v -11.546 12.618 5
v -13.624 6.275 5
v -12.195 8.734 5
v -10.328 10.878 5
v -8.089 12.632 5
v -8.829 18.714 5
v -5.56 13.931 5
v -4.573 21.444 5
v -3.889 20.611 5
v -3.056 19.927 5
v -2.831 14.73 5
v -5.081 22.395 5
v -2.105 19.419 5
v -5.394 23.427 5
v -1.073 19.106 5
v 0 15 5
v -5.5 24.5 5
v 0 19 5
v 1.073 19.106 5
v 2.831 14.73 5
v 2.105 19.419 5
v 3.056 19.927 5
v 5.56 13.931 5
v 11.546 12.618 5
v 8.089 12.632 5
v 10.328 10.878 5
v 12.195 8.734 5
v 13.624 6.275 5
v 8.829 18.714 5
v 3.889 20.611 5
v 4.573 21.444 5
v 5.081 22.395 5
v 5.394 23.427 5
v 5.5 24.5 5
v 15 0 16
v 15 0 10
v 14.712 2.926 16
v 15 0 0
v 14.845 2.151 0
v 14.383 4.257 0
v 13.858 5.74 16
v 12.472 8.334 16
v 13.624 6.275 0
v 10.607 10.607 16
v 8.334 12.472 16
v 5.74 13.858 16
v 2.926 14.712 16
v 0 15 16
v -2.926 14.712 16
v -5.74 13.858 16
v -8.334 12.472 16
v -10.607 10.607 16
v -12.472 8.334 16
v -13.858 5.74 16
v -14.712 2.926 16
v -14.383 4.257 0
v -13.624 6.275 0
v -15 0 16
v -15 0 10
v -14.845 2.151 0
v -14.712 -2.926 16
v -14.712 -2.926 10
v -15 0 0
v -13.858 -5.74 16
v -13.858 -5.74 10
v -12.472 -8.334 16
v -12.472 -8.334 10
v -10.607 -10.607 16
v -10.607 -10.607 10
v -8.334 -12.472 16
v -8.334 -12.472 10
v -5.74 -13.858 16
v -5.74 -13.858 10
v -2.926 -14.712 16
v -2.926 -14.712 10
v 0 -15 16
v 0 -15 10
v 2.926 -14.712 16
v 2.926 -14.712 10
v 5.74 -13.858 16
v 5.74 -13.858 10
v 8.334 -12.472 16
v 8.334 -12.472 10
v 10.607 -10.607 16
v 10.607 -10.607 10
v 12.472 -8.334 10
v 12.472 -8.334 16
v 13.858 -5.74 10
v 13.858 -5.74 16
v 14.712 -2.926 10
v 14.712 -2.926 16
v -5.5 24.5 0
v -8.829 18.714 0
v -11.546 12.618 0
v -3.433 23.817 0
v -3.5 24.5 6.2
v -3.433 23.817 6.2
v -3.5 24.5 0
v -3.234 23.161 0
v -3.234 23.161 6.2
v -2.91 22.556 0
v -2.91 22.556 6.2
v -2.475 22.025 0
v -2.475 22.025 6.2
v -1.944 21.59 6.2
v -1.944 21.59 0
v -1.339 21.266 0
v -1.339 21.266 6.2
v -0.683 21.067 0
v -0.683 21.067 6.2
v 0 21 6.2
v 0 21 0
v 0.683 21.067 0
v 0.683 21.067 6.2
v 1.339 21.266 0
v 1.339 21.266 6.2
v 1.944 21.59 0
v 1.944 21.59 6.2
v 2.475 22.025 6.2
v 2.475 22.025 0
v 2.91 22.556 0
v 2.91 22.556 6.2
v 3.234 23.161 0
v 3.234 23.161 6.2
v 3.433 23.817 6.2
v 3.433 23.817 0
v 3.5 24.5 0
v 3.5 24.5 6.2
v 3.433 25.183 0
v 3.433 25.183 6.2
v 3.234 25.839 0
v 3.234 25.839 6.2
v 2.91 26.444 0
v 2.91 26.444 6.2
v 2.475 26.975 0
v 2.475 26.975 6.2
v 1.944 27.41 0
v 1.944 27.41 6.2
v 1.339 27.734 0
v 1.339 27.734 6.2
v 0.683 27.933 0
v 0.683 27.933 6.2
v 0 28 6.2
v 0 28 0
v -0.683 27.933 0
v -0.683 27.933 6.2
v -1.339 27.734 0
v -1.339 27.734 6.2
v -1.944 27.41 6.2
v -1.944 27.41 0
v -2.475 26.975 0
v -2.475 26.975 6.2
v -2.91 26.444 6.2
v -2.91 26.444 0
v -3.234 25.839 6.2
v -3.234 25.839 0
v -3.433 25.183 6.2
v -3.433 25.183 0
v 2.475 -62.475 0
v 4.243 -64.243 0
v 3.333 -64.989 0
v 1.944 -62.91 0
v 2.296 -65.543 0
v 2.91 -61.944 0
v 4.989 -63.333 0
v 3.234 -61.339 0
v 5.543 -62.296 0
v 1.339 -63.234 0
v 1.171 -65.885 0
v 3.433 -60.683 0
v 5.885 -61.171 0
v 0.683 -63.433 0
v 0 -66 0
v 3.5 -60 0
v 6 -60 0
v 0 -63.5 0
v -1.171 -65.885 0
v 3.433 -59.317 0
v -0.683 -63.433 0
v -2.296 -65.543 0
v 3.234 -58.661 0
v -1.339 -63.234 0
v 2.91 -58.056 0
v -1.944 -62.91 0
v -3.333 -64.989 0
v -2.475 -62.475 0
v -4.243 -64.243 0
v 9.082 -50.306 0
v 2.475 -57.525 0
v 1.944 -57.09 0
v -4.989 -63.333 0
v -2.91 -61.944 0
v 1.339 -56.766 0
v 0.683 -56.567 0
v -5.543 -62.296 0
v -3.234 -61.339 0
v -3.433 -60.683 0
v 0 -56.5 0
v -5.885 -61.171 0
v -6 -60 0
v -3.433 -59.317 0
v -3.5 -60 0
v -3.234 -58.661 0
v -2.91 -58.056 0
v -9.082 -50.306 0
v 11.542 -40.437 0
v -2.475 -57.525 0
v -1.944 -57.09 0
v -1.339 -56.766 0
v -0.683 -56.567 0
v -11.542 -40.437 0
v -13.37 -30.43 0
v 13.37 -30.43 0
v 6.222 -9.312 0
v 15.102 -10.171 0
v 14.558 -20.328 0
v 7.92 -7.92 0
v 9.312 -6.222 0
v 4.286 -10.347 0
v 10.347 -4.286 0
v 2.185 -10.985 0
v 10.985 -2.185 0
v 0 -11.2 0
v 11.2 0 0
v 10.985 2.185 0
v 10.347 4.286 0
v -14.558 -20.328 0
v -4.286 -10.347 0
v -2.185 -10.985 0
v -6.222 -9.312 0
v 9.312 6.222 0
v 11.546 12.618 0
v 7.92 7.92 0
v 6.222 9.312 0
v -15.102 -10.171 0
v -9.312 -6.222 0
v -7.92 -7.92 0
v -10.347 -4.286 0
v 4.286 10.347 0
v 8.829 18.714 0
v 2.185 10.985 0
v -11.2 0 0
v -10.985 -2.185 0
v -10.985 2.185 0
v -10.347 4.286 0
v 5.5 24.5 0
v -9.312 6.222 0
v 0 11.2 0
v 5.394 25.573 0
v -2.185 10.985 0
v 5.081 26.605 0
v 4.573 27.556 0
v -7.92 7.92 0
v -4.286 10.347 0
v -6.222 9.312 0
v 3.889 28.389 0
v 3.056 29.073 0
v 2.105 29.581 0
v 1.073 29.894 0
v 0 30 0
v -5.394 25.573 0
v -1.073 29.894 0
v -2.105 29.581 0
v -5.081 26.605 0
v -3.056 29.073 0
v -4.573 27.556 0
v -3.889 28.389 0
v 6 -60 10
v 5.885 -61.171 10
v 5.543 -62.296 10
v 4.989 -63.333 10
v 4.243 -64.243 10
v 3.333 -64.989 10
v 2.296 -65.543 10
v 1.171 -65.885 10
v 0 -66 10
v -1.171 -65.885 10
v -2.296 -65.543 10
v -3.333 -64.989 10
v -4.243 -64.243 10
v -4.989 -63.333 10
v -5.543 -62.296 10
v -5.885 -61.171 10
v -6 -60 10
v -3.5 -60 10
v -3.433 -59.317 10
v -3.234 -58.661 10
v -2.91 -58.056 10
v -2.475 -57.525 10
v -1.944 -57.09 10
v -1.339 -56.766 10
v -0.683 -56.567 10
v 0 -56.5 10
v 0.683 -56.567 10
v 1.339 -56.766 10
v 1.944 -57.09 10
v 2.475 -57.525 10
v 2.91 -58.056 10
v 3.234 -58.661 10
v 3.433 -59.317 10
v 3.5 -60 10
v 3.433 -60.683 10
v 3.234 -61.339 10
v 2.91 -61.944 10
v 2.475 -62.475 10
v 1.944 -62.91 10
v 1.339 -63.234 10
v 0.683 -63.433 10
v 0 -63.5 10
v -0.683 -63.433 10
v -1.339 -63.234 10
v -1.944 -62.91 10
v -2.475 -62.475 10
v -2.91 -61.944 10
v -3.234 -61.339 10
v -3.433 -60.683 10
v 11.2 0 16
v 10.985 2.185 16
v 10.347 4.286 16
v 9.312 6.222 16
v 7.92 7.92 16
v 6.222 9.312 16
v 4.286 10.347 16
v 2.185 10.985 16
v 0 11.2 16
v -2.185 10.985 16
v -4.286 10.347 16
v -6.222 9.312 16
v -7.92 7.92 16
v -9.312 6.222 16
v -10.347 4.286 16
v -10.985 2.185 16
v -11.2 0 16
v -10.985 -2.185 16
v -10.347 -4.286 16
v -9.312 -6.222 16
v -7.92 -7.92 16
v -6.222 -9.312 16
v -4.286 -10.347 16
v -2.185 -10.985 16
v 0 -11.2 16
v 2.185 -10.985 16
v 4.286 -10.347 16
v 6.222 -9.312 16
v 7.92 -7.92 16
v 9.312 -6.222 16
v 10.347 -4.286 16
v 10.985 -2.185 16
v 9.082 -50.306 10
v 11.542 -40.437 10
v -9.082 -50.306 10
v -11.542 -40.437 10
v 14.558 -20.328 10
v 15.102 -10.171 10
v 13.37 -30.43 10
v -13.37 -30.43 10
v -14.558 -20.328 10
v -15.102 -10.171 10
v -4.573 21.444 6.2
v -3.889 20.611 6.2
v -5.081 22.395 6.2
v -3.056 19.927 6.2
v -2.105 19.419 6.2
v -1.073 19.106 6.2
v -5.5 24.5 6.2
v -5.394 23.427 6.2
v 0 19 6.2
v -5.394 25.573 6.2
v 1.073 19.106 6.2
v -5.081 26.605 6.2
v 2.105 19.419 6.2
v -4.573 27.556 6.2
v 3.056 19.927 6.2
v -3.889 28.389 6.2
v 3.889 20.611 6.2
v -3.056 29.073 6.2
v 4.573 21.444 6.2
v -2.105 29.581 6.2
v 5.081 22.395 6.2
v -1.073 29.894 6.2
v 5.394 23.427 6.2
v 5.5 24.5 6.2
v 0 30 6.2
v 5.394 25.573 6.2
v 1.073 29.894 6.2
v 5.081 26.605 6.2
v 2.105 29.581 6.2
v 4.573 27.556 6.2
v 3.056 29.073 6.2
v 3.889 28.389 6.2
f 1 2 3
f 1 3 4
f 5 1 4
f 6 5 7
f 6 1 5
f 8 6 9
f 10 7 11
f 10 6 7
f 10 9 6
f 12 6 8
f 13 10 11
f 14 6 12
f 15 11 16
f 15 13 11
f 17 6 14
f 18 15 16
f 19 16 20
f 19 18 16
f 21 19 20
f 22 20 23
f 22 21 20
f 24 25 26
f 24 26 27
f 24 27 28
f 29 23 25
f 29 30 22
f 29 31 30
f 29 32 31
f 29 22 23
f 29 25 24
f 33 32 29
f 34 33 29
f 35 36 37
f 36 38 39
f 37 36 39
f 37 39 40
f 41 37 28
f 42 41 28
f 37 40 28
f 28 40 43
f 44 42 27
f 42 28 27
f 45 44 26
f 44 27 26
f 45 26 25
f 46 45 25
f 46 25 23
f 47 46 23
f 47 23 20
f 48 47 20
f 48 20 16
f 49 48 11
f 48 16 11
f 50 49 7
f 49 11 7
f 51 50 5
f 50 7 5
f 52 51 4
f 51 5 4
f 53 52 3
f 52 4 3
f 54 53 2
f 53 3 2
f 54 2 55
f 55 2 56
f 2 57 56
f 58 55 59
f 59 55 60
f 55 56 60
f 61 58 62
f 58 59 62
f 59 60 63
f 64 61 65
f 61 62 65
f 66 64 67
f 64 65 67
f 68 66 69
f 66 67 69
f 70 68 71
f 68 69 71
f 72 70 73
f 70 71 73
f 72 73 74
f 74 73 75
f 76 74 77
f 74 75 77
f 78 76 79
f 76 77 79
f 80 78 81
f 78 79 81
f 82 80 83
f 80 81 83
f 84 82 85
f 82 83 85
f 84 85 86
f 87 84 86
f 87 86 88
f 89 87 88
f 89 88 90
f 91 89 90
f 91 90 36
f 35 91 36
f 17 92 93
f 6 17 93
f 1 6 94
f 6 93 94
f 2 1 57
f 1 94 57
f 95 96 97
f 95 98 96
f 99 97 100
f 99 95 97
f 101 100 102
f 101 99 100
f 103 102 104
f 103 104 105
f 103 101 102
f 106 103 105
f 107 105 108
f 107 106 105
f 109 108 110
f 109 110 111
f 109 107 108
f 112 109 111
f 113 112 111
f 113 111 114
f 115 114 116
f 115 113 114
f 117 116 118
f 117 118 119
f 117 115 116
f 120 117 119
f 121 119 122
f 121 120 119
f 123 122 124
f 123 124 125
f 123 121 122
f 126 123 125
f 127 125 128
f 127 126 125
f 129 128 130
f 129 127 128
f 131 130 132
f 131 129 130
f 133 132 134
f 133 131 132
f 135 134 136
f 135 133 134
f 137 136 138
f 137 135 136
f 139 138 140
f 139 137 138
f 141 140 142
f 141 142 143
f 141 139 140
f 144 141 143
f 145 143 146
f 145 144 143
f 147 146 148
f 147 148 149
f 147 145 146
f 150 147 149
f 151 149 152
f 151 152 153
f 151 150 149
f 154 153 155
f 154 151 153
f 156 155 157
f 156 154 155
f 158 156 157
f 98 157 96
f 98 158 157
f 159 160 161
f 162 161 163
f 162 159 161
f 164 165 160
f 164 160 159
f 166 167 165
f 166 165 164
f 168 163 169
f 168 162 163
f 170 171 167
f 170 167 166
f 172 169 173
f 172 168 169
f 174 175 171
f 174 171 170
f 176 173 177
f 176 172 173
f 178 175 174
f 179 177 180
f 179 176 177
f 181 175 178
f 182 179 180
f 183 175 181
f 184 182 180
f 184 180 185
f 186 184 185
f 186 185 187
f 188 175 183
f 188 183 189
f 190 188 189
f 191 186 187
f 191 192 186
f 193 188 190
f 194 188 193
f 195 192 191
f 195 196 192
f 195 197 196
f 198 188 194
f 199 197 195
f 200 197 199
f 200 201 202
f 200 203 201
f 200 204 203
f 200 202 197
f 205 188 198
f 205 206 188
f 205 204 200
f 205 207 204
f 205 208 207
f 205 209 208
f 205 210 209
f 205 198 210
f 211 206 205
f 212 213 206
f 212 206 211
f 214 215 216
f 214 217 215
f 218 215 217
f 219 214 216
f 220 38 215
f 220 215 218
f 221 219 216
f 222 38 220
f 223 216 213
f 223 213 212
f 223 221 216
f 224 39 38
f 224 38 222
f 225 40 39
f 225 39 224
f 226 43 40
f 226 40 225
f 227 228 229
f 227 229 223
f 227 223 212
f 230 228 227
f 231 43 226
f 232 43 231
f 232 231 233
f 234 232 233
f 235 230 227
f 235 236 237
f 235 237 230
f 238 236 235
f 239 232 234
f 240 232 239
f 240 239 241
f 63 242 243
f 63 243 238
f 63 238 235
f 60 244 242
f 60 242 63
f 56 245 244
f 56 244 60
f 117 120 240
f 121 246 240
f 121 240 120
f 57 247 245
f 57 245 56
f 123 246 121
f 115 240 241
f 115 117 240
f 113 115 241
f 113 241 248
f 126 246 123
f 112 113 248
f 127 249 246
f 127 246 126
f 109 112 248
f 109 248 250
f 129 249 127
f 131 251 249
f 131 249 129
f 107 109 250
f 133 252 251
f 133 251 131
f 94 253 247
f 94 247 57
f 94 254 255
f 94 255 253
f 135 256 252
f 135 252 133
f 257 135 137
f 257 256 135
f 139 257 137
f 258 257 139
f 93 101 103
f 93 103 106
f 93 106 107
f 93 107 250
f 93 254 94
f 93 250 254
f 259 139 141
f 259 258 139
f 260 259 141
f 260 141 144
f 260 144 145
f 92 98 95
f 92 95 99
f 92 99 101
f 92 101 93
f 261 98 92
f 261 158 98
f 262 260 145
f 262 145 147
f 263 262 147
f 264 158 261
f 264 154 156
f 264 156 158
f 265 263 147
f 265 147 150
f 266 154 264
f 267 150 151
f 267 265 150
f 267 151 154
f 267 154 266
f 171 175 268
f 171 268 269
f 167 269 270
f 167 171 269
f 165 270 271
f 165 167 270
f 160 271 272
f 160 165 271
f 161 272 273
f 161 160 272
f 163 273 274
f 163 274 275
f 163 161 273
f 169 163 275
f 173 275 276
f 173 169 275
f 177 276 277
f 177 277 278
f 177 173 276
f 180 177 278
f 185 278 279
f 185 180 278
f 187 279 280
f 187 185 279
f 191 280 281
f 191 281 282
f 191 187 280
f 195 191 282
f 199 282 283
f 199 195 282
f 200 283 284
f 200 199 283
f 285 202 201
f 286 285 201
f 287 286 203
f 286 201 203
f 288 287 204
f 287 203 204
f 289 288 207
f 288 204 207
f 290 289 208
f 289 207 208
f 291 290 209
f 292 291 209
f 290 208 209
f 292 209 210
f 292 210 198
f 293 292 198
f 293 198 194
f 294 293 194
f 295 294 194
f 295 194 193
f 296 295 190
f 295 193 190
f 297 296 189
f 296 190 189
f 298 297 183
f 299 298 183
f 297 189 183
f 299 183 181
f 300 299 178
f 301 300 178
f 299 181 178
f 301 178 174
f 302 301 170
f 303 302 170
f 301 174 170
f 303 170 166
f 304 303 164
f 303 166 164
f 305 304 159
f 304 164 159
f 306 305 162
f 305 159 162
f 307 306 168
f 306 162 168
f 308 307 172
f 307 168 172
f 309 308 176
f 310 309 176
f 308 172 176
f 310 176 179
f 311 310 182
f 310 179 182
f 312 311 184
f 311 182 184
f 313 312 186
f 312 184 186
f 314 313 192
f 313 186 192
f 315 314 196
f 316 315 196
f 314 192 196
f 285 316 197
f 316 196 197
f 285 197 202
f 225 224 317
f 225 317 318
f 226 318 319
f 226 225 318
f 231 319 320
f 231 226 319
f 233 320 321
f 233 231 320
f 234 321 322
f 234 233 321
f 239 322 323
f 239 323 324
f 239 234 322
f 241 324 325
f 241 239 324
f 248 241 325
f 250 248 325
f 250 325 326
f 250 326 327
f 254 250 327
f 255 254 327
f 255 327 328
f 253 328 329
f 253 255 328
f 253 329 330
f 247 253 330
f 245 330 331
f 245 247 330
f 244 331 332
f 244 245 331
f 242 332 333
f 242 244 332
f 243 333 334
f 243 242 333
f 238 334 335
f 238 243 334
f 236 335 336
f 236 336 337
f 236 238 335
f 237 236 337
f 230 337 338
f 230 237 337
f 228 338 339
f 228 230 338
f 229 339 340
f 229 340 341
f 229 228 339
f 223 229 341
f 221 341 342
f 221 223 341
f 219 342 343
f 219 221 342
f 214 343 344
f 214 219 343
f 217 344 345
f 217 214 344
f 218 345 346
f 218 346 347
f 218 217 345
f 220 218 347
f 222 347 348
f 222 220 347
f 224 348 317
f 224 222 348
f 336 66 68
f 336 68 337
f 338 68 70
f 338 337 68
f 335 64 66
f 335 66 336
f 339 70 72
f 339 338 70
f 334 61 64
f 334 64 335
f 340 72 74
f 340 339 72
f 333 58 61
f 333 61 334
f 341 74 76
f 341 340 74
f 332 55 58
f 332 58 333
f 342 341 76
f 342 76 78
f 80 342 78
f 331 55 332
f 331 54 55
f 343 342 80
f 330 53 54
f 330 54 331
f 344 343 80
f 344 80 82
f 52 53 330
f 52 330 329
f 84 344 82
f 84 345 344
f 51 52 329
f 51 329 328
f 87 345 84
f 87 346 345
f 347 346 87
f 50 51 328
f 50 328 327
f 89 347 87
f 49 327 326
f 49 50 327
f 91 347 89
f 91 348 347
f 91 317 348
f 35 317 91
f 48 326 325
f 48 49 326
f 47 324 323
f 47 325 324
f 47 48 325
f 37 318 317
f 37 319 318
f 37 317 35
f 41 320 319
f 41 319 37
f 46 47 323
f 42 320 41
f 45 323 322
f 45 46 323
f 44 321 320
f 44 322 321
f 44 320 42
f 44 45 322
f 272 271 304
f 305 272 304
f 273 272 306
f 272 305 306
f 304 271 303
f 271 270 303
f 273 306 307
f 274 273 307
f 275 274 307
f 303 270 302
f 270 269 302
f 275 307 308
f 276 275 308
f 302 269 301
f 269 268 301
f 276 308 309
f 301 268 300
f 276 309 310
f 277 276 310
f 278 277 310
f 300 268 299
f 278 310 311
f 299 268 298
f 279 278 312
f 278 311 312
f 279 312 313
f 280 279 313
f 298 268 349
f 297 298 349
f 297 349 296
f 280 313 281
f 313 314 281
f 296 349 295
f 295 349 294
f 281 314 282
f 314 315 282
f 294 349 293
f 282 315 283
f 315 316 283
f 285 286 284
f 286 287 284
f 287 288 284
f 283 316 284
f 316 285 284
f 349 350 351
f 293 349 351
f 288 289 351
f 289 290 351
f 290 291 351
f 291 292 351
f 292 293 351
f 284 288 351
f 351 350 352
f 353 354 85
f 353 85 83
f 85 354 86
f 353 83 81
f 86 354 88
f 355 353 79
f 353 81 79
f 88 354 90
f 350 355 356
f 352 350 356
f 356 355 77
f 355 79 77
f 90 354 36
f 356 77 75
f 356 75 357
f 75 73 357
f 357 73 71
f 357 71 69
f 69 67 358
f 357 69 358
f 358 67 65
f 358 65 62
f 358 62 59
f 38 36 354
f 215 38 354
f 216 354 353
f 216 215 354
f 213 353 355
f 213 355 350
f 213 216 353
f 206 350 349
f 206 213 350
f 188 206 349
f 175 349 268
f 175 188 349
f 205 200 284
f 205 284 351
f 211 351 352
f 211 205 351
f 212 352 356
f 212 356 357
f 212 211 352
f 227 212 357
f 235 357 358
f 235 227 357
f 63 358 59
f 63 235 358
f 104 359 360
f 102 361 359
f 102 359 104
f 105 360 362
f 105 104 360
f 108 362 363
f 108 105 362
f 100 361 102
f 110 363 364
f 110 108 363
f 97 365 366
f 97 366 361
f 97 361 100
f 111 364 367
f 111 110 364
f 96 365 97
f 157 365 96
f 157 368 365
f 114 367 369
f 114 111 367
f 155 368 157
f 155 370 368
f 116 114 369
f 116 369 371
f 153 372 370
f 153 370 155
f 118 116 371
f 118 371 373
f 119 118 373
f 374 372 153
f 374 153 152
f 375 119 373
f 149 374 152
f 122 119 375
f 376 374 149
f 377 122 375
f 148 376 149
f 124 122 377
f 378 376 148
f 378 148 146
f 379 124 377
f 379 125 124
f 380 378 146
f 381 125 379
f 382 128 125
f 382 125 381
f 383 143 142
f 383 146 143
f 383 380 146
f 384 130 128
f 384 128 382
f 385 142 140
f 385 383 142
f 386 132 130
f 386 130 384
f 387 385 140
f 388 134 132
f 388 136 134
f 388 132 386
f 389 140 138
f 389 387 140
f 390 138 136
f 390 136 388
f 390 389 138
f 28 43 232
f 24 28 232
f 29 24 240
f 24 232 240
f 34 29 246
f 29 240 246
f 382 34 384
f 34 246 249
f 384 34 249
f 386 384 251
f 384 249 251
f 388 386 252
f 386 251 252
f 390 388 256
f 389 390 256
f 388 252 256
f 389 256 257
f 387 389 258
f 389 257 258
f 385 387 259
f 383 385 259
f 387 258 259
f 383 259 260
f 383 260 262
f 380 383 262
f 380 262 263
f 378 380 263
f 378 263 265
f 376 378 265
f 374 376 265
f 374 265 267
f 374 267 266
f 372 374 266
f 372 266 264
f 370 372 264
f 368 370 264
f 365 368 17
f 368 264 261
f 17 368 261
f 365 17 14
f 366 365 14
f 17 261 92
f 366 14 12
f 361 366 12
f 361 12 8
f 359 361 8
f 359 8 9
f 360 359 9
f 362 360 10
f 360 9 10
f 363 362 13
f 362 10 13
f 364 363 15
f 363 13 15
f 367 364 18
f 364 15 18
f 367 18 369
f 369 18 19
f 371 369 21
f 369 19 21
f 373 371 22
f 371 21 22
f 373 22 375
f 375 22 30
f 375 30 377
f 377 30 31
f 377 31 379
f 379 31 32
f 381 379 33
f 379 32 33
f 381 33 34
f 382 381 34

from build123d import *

# Parameters (mm, degrees)
SKETCH1_R           = 15
SKETCH1_R_2         = 11.2
BOSS_EXTRUDE1_DEPTH = 16
SKETCH2_R           = 5.5
SKETCH2_R_2         = 3.5
BOSS_EXTRUDE2_DEPTH = 5
SKETCH3_R           = 3.5
BOSS_EXTRUDE3_DEPTH = 10
SKETCH4_R           = 5.5
SKETCH4_R_2         = 3.5
BOSS_EXTRUDE4_DEPTH = 1.2


with BuildPart() as part:
    # Sketch1 → Boss-Extrude1 (new body)
    with BuildSketch(Plane.XY):
        Circle(SKETCH1_R)
        Circle(SKETCH1_R_2, mode=Mode.SUBTRACT)
    extrude(amount=BOSS_EXTRUDE1_DEPTH)

    # Sketch2 → Boss-Extrude2 (add)
    # profile 1 of 3: a face of its own
    with BuildSketch(Plane.XY):
        with Locations((-21.217622393, 12.25)):
            Circle(SKETCH2_R)
        with Locations((-21.217622393, 12.25)):
            Circle(SKETCH2_R_2, mode=Mode.SUBTRACT)
    # profile 2 of 3: a face of its own
    with BuildSketch(Plane.XY):
        with BuildLine():
            ThreePointArc((13.624389704, 6.275030295), (10.26570525, 15.701128433), (5.5, 24.5))
            ThreePointArc((5.5, 24.5), (0, 19), (-5.5, 24.5))
            ThreePointArc((-5.5, 24.5), (-10.26570525, 15.701128433), (-13.624389704, 6.275030295))
            ThreePointArc((-13.624389704, 6.275030295), (0, 15), (13.624389704, 6.275030295))
        make_face()
    # profile 3 of 3: a face of its own
    with BuildSketch(Plane.XY):
        with Locations((0, 24.5)):
            Circle(SKETCH2_R)
        with Locations(Location((0, 24.5, 0), (0, 0, 180))):
            Circle(SKETCH2_R_2, mode=Mode.SUBTRACT)
    extrude(amount=BOSS_EXTRUDE2_DEPTH)


with BuildPart() as boss_extrude2_kept_piece:
    # of the separate pieces the step leaves, the one the design keeps (boss_extrude2_pieces_kept)
    add(part.part.solids().sort_by_distance((15, 0, 0))[0])

    # Sketch3 → Boss-Extrude3 (add)
    with BuildSketch(Plane(origin=(0, 0, 0), x_dir=(-1, 0, 0), z_dir=(0, 0, -1))):
        with BuildLine():
            ThreePointArc((15, 0), (0, -15), (-15, 0))
            ThreePointArc((-15, 0), (-13.36999277, -30.430498916), (-6, -60))
            ThreePointArc((-6, -60), (0, -66), (6, -60))
            ThreePointArc((6, -60), (13.36999277, -30.430498916), (15, 0))
        make_face()
        with Locations((0, -60)):
            Circle(SKETCH3_R, mode=Mode.SUBTRACT)
    extrude(amount=-BOSS_EXTRUDE3_DEPTH)

    # Sketch4 → Boss-Extrude4 (add)
    with BuildSketch(Plane.XY.offset(5)):
        with Locations((0, 24.5)):
            Circle(SKETCH4_R)
        with Locations(Location((0, 24.5, 0), (0, 0, 180))):
            Circle(SKETCH4_R_2, mode=Mode.SUBTRACT)
    extrude(amount=BOSS_EXTRUDE4_DEPTH)


solid = boss_extrude2_kept_piece.part
